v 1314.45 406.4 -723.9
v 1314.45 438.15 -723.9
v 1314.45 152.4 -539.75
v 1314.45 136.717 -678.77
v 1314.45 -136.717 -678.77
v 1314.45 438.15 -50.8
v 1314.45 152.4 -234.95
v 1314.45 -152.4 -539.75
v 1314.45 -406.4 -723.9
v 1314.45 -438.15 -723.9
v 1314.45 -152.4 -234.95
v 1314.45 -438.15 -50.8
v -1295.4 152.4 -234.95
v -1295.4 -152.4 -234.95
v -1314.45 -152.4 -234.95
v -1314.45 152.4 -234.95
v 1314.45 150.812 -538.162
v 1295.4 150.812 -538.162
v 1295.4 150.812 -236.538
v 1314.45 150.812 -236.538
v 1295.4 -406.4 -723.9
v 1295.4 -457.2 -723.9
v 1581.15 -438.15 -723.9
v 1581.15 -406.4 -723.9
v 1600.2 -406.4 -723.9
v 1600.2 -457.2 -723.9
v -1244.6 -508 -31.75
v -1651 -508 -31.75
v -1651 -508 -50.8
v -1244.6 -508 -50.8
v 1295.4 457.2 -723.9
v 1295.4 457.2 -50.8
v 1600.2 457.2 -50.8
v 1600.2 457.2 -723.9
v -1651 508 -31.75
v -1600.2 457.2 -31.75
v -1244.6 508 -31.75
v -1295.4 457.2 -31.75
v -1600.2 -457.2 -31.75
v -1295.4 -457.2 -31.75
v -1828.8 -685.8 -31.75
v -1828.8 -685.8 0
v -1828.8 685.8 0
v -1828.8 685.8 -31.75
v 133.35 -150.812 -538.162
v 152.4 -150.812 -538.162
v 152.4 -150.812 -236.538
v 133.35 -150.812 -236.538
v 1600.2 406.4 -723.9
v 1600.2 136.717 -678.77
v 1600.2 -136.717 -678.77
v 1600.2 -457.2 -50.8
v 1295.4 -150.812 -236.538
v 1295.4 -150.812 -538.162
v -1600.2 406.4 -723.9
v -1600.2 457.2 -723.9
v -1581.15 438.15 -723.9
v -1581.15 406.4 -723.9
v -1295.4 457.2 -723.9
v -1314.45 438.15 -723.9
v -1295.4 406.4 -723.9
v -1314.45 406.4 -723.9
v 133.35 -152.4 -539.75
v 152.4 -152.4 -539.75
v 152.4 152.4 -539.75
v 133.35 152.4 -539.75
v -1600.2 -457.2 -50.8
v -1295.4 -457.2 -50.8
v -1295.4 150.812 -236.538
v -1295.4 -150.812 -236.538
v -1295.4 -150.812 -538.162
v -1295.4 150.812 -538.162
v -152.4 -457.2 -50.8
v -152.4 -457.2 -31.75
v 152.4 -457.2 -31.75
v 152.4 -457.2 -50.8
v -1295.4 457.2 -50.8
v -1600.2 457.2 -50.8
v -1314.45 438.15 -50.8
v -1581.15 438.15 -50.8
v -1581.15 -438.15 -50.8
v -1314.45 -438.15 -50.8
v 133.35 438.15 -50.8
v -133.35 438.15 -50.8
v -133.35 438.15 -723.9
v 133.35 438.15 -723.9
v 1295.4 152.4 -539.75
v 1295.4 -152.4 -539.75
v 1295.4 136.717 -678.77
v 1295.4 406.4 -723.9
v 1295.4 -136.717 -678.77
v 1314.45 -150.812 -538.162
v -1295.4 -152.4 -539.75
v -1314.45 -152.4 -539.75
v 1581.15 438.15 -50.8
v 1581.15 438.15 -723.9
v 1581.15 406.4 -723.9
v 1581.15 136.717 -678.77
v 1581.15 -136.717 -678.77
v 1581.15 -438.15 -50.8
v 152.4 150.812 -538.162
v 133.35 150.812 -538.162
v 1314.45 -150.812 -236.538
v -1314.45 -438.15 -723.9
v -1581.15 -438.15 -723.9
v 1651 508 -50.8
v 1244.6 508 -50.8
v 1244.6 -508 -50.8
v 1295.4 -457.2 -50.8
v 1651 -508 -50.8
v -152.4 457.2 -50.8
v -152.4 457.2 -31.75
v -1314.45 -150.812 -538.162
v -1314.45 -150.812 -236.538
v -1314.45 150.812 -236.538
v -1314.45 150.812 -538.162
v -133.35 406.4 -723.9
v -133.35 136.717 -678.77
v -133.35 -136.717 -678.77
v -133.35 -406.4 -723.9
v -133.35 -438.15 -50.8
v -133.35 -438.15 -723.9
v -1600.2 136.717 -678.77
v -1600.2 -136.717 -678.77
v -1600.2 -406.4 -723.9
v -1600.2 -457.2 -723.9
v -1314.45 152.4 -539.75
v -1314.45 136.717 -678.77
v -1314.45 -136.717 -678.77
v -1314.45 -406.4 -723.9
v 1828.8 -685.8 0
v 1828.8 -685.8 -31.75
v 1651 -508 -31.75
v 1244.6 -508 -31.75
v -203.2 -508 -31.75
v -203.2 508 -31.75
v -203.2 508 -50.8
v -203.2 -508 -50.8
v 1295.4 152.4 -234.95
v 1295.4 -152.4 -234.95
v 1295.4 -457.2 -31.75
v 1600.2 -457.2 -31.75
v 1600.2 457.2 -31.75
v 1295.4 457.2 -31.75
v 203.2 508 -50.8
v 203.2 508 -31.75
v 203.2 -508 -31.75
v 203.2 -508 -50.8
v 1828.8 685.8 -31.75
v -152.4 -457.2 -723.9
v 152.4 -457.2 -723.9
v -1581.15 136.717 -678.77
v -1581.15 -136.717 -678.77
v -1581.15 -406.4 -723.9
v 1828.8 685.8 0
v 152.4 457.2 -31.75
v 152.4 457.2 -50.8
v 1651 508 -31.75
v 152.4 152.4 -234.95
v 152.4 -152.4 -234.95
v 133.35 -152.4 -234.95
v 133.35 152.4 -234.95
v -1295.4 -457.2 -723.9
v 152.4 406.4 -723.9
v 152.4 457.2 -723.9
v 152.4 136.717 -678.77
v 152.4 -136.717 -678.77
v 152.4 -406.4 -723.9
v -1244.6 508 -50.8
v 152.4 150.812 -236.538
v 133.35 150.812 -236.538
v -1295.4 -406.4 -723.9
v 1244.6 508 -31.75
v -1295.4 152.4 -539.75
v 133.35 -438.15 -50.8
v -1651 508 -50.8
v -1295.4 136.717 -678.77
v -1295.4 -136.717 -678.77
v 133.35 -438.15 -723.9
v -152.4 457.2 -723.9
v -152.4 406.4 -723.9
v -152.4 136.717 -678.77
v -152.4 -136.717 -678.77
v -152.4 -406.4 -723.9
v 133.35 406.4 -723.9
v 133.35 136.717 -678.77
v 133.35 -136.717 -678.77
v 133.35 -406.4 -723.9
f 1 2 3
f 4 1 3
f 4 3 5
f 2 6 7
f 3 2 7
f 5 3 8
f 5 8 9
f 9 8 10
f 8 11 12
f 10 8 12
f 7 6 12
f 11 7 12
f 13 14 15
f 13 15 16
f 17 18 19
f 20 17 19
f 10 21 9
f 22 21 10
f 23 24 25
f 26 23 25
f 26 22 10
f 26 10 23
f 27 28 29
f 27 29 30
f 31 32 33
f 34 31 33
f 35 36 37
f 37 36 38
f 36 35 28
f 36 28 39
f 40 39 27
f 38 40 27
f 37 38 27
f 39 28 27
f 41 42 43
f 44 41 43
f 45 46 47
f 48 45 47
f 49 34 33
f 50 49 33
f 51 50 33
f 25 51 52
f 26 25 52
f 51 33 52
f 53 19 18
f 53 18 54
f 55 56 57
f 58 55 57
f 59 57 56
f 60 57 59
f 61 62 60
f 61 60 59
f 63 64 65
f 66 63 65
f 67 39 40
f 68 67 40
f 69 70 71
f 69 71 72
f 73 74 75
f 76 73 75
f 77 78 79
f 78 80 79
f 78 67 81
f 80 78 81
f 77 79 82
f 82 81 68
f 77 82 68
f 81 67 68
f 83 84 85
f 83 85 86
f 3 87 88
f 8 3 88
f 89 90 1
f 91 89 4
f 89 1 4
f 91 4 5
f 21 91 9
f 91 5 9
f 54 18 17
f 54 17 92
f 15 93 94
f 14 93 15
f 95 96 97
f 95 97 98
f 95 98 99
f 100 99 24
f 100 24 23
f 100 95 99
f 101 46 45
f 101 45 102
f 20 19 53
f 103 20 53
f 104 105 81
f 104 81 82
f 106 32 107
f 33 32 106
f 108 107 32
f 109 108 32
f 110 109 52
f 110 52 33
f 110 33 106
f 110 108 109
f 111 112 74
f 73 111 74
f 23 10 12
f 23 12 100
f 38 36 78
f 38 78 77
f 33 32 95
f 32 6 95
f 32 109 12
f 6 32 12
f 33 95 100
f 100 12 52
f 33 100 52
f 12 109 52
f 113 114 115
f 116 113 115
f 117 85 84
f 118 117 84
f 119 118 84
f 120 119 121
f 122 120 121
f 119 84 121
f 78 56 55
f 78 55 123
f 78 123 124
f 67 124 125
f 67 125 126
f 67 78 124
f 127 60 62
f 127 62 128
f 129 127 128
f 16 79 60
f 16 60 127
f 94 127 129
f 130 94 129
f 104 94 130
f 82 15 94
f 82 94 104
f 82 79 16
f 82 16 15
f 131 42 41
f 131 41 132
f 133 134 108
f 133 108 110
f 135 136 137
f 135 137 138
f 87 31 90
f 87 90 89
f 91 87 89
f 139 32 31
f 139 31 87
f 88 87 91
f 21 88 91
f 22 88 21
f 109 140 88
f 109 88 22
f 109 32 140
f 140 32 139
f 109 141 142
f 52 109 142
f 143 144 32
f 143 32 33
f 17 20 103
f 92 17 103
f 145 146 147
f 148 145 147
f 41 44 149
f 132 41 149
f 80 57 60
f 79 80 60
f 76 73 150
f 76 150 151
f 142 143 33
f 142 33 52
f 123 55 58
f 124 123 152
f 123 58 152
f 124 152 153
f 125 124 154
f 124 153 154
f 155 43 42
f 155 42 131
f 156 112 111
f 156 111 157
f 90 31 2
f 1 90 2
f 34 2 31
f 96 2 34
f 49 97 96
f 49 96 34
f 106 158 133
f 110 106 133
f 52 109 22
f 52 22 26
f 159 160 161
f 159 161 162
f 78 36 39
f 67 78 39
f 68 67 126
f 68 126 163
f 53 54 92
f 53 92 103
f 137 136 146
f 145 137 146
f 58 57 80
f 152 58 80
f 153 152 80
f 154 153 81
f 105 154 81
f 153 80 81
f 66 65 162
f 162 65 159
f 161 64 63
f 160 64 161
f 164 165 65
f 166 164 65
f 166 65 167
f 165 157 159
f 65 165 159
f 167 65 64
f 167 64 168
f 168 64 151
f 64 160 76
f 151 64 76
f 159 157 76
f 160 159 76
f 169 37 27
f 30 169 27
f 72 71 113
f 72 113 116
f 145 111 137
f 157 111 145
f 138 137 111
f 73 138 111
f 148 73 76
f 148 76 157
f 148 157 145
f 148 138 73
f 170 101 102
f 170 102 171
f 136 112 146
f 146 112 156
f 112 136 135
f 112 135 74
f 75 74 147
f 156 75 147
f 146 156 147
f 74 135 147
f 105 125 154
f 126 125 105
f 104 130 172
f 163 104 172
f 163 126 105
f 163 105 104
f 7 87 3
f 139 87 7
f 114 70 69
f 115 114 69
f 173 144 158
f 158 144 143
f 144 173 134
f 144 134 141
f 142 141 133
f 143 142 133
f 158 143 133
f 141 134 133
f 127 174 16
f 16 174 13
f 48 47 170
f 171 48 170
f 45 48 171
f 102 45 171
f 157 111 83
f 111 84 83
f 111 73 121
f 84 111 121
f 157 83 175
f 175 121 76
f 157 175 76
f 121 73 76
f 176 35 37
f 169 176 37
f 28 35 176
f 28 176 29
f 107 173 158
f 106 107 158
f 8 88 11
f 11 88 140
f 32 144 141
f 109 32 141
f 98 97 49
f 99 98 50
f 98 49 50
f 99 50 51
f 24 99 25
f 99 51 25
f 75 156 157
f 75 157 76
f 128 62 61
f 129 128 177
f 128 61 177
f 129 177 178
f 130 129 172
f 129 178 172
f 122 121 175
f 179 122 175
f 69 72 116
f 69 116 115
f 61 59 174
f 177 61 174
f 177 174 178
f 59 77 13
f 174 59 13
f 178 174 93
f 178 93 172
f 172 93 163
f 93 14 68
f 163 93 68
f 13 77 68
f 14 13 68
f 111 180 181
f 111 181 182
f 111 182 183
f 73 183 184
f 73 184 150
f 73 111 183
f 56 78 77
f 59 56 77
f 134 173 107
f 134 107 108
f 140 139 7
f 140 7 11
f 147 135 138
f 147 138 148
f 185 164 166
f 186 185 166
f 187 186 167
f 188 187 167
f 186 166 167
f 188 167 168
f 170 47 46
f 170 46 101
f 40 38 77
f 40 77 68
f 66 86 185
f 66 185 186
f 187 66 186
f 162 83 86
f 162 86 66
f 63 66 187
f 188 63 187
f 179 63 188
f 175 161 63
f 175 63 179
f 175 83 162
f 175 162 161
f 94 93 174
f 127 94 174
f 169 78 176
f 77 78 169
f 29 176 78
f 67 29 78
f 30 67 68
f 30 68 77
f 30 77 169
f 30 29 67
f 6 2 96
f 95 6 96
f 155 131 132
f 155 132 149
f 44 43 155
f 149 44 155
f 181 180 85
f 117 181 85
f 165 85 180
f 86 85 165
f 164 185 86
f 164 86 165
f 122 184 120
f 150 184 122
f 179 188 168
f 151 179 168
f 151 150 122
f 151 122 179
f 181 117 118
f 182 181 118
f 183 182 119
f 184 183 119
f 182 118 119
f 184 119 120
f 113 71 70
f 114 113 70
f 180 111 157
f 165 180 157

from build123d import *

# Parameters (mm, degrees)
F0_W      = 3657.6
F0_H      = 1371.6
F1_DEPTH  = 31.75
F2_W      = 406.4
F2_H      = 1016
F2_W_2    = 304.8
F2_H_2    = 914.4
F3_DEPTH  = 19.05
F4_W      = 304.8
F4_H      = 914.4
F4_W_2    = 266.7
F4_H_2    = 876.3
F5_DEPTH  = 673.1
F7_DEPTH  = 3657.6
F9_DEPTH  = 1981.201
F10_W     = 304.8
F10_H     = 304.8
F11_DEPTH = 25.4
F12_W     = 304.8
F12_H     = 304.8
F13_DEPTH = 25.4
F14_W     = 304.8
F14_H     = 304.8
F15_DEPTH = 25.4
F16_W     = 301.625
F16_H     = 301.625
F17_DEPTH = 19.05
F18_W     = 301.625
F18_H     = 301.625
F19_DEPTH = 19.05
F20_W     = 301.625
F20_H     = 301.625
F21_DEPTH = 19.05


with BuildPart() as f1:
    # F0 (on Top) → F1 (new body)
    with BuildSketch(Plane.XY):
        Rectangle(F0_W, F0_H)
    extrude(amount=-F1_DEPTH)

    # F8 (on face) → F9 (cut, through all)
    with BuildSketch(Plane.YZ.offset(152.4)):
        with BuildLine():
            Line((-406.4, -723.9), (406.4, -723.9))
            ThreePointArc((406.4, -723.9), (0, -673.1), (-406.4, -723.9))
        make_face()
    extrude(amount=-F9_DEPTH, mode=Mode.SUBTRACT)


with BuildPart() as f3:
    # F2 (on face) → F3 (new body)
    with BuildSketch(Plane(origin=(0, 0, -31.75), x_dir=(1, 0, 0), z_dir=(0, 0, -1))):
        with Locations((-1447.8, 0)):
            Rectangle(F2_W, F2_H)
        with Locations((-1447.8, 0)):
            Rectangle(F2_W_2, F2_H_2, mode=Mode.SUBTRACT)
    extrude(amount=F3_DEPTH)


with BuildPart() as f3b:
    # F2 (on face) → F3, piece 2 (new body)
    with BuildSketch(Plane(origin=(0, 0, -31.75), x_dir=(1, 0, 0), z_dir=(0, 0, -1))):
        Rectangle(F2_W, F2_H)
        Rectangle(F2_W_2, F2_H_2, mode=Mode.SUBTRACT)
    extrude(amount=F3_DEPTH)


with BuildPart() as f3c:
    # F2 (on face) → F3, piece 3 (new body)
    with BuildSketch(Plane(origin=(0, 0, -31.75), x_dir=(1, 0, 0), z_dir=(0, 0, -1))):
        with Locations((1447.8, 0)):
            Rectangle(F2_W, F2_H)
        with Locations((1447.8, 0)):
            Rectangle(F2_W_2, F2_H_2, mode=Mode.SUBTRACT)
    extrude(amount=F3_DEPTH)


with BuildPart() as f5:
    # F4 (on face) → F5 (new body)
    with BuildSketch(Plane(origin=(0, 0, -50.8), x_dir=(1, 0, 0), z_dir=(0, 0, -1))):
        with Locations((-1447.8, 0)):
            Rectangle(F4_W, F4_H)
        with Locations((-1447.8, 0)):
            Rectangle(F4_W_2, F4_H_2, mode=Mode.SUBTRACT)
    extrude(amount=F5_DEPTH)


with BuildPart() as f5b:
    # F4 (on face) → F5, piece 2 (new body)
    with BuildSketch(Plane(origin=(0, 0, -50.8), x_dir=(1, 0, 0), z_dir=(0, 0, -1))):
        Rectangle(F4_W, F4_H)
        Rectangle(F4_W_2, F4_H_2, mode=Mode.SUBTRACT)
    extrude(amount=F5_DEPTH)


with BuildPart() as f5c:
    # F4 (on face) → F5, piece 3 (new body)
    with BuildSketch(Plane(origin=(0, 0, -50.8), x_dir=(1, 0, 0), z_dir=(0, 0, -1))):
        with Locations((1447.8, 0)):
            Rectangle(F4_W, F4_H)
        with Locations((1447.8, 0)):
            Rectangle(F4_W_2, F4_H_2, mode=Mode.SUBTRACT)
    extrude(amount=F5_DEPTH)


with BuildPart() as f7_tool:
    # F6 (on face) → F7 (new body)
    with BuildSketch(Plane.YZ.offset(1600.2)):
        with BuildLine():
            Line((-406.4, -723.9), (406.4, -723.9))
            ThreePointArc((406.4, -723.9), (0, -673.1), (-406.4, -723.9))
        make_face()
    extrude(amount=-F7_DEPTH)


with BuildPart() as f5_1:
    add(f5.part)

    # F7: cut by f7_tool
    add(f7_tool.part, mode=Mode.SUBTRACT)

    # F10 (on face) → F11 (cut)
    with BuildSketch(Plane.YZ.offset(-1295.4)):
        with Locations((0, -387.35)):
            Rectangle(F10_W, F10_H)
    extrude(amount=-F11_DEPTH, mode=Mode.SUBTRACT)


with BuildPart() as f5b_1:
    add(f5b.part)

    # F7: cut by f7_tool
    add(f7_tool.part, mode=Mode.SUBTRACT)

    # F12 (on face) → F13 (cut)
    with BuildSketch(Plane.YZ.offset(152.4)):
        with Locations((0, -387.35)):
            Rectangle(F12_W, F12_H)
    extrude(amount=-F13_DEPTH, mode=Mode.SUBTRACT)


with BuildPart() as f5c_1:
    add(f5c.part)

    # F7: cut by f7_tool
    add(f7_tool.part, mode=Mode.SUBTRACT)

    # F14 (on face) → F15 (cut)
    with BuildSketch(Plane(origin=(1295.4, 0, 0), x_dir=(0, -1, 0), z_dir=(-1, 0, 0))):
        with Locations((0, -387.35)):
            Rectangle(F14_W, F14_H)
    extrude(amount=-F15_DEPTH, mode=Mode.SUBTRACT)


with BuildPart() as f17:
    # F16 (on face) → F17 (new body)
    with BuildSketch(Plane.YZ.offset(-1295.4)):
        with Locations((0, -387.35)):
            Rectangle(F16_W, F16_H)
    extrude(amount=-F17_DEPTH)


with BuildPart() as f19:
    # F18 (on face) → F19 (new body)
    with BuildSketch(Plane.YZ.offset(152.4)):
        with Locations((0, -387.35)):
            Rectangle(F18_W, F18_H)
    extrude(amount=-F19_DEPTH)


with BuildPart() as f21:
    # F20 (on face) → F21 (new body)
    with BuildSketch(Plane(origin=(1295.4, 0, 0), x_dir=(0, -1, 0), z_dir=(-1, 0, 0))):
        with Locations((0, -387.35)):
            Rectangle(F20_W, F20_H)
    extrude(amount=-F21_DEPTH)


solid = Compound([f1.part, f3.part, f3b.part, f3c.part, f5_1.part, f5b_1.part, f5c_1.part, f17.part, f19.part, f21.part])
